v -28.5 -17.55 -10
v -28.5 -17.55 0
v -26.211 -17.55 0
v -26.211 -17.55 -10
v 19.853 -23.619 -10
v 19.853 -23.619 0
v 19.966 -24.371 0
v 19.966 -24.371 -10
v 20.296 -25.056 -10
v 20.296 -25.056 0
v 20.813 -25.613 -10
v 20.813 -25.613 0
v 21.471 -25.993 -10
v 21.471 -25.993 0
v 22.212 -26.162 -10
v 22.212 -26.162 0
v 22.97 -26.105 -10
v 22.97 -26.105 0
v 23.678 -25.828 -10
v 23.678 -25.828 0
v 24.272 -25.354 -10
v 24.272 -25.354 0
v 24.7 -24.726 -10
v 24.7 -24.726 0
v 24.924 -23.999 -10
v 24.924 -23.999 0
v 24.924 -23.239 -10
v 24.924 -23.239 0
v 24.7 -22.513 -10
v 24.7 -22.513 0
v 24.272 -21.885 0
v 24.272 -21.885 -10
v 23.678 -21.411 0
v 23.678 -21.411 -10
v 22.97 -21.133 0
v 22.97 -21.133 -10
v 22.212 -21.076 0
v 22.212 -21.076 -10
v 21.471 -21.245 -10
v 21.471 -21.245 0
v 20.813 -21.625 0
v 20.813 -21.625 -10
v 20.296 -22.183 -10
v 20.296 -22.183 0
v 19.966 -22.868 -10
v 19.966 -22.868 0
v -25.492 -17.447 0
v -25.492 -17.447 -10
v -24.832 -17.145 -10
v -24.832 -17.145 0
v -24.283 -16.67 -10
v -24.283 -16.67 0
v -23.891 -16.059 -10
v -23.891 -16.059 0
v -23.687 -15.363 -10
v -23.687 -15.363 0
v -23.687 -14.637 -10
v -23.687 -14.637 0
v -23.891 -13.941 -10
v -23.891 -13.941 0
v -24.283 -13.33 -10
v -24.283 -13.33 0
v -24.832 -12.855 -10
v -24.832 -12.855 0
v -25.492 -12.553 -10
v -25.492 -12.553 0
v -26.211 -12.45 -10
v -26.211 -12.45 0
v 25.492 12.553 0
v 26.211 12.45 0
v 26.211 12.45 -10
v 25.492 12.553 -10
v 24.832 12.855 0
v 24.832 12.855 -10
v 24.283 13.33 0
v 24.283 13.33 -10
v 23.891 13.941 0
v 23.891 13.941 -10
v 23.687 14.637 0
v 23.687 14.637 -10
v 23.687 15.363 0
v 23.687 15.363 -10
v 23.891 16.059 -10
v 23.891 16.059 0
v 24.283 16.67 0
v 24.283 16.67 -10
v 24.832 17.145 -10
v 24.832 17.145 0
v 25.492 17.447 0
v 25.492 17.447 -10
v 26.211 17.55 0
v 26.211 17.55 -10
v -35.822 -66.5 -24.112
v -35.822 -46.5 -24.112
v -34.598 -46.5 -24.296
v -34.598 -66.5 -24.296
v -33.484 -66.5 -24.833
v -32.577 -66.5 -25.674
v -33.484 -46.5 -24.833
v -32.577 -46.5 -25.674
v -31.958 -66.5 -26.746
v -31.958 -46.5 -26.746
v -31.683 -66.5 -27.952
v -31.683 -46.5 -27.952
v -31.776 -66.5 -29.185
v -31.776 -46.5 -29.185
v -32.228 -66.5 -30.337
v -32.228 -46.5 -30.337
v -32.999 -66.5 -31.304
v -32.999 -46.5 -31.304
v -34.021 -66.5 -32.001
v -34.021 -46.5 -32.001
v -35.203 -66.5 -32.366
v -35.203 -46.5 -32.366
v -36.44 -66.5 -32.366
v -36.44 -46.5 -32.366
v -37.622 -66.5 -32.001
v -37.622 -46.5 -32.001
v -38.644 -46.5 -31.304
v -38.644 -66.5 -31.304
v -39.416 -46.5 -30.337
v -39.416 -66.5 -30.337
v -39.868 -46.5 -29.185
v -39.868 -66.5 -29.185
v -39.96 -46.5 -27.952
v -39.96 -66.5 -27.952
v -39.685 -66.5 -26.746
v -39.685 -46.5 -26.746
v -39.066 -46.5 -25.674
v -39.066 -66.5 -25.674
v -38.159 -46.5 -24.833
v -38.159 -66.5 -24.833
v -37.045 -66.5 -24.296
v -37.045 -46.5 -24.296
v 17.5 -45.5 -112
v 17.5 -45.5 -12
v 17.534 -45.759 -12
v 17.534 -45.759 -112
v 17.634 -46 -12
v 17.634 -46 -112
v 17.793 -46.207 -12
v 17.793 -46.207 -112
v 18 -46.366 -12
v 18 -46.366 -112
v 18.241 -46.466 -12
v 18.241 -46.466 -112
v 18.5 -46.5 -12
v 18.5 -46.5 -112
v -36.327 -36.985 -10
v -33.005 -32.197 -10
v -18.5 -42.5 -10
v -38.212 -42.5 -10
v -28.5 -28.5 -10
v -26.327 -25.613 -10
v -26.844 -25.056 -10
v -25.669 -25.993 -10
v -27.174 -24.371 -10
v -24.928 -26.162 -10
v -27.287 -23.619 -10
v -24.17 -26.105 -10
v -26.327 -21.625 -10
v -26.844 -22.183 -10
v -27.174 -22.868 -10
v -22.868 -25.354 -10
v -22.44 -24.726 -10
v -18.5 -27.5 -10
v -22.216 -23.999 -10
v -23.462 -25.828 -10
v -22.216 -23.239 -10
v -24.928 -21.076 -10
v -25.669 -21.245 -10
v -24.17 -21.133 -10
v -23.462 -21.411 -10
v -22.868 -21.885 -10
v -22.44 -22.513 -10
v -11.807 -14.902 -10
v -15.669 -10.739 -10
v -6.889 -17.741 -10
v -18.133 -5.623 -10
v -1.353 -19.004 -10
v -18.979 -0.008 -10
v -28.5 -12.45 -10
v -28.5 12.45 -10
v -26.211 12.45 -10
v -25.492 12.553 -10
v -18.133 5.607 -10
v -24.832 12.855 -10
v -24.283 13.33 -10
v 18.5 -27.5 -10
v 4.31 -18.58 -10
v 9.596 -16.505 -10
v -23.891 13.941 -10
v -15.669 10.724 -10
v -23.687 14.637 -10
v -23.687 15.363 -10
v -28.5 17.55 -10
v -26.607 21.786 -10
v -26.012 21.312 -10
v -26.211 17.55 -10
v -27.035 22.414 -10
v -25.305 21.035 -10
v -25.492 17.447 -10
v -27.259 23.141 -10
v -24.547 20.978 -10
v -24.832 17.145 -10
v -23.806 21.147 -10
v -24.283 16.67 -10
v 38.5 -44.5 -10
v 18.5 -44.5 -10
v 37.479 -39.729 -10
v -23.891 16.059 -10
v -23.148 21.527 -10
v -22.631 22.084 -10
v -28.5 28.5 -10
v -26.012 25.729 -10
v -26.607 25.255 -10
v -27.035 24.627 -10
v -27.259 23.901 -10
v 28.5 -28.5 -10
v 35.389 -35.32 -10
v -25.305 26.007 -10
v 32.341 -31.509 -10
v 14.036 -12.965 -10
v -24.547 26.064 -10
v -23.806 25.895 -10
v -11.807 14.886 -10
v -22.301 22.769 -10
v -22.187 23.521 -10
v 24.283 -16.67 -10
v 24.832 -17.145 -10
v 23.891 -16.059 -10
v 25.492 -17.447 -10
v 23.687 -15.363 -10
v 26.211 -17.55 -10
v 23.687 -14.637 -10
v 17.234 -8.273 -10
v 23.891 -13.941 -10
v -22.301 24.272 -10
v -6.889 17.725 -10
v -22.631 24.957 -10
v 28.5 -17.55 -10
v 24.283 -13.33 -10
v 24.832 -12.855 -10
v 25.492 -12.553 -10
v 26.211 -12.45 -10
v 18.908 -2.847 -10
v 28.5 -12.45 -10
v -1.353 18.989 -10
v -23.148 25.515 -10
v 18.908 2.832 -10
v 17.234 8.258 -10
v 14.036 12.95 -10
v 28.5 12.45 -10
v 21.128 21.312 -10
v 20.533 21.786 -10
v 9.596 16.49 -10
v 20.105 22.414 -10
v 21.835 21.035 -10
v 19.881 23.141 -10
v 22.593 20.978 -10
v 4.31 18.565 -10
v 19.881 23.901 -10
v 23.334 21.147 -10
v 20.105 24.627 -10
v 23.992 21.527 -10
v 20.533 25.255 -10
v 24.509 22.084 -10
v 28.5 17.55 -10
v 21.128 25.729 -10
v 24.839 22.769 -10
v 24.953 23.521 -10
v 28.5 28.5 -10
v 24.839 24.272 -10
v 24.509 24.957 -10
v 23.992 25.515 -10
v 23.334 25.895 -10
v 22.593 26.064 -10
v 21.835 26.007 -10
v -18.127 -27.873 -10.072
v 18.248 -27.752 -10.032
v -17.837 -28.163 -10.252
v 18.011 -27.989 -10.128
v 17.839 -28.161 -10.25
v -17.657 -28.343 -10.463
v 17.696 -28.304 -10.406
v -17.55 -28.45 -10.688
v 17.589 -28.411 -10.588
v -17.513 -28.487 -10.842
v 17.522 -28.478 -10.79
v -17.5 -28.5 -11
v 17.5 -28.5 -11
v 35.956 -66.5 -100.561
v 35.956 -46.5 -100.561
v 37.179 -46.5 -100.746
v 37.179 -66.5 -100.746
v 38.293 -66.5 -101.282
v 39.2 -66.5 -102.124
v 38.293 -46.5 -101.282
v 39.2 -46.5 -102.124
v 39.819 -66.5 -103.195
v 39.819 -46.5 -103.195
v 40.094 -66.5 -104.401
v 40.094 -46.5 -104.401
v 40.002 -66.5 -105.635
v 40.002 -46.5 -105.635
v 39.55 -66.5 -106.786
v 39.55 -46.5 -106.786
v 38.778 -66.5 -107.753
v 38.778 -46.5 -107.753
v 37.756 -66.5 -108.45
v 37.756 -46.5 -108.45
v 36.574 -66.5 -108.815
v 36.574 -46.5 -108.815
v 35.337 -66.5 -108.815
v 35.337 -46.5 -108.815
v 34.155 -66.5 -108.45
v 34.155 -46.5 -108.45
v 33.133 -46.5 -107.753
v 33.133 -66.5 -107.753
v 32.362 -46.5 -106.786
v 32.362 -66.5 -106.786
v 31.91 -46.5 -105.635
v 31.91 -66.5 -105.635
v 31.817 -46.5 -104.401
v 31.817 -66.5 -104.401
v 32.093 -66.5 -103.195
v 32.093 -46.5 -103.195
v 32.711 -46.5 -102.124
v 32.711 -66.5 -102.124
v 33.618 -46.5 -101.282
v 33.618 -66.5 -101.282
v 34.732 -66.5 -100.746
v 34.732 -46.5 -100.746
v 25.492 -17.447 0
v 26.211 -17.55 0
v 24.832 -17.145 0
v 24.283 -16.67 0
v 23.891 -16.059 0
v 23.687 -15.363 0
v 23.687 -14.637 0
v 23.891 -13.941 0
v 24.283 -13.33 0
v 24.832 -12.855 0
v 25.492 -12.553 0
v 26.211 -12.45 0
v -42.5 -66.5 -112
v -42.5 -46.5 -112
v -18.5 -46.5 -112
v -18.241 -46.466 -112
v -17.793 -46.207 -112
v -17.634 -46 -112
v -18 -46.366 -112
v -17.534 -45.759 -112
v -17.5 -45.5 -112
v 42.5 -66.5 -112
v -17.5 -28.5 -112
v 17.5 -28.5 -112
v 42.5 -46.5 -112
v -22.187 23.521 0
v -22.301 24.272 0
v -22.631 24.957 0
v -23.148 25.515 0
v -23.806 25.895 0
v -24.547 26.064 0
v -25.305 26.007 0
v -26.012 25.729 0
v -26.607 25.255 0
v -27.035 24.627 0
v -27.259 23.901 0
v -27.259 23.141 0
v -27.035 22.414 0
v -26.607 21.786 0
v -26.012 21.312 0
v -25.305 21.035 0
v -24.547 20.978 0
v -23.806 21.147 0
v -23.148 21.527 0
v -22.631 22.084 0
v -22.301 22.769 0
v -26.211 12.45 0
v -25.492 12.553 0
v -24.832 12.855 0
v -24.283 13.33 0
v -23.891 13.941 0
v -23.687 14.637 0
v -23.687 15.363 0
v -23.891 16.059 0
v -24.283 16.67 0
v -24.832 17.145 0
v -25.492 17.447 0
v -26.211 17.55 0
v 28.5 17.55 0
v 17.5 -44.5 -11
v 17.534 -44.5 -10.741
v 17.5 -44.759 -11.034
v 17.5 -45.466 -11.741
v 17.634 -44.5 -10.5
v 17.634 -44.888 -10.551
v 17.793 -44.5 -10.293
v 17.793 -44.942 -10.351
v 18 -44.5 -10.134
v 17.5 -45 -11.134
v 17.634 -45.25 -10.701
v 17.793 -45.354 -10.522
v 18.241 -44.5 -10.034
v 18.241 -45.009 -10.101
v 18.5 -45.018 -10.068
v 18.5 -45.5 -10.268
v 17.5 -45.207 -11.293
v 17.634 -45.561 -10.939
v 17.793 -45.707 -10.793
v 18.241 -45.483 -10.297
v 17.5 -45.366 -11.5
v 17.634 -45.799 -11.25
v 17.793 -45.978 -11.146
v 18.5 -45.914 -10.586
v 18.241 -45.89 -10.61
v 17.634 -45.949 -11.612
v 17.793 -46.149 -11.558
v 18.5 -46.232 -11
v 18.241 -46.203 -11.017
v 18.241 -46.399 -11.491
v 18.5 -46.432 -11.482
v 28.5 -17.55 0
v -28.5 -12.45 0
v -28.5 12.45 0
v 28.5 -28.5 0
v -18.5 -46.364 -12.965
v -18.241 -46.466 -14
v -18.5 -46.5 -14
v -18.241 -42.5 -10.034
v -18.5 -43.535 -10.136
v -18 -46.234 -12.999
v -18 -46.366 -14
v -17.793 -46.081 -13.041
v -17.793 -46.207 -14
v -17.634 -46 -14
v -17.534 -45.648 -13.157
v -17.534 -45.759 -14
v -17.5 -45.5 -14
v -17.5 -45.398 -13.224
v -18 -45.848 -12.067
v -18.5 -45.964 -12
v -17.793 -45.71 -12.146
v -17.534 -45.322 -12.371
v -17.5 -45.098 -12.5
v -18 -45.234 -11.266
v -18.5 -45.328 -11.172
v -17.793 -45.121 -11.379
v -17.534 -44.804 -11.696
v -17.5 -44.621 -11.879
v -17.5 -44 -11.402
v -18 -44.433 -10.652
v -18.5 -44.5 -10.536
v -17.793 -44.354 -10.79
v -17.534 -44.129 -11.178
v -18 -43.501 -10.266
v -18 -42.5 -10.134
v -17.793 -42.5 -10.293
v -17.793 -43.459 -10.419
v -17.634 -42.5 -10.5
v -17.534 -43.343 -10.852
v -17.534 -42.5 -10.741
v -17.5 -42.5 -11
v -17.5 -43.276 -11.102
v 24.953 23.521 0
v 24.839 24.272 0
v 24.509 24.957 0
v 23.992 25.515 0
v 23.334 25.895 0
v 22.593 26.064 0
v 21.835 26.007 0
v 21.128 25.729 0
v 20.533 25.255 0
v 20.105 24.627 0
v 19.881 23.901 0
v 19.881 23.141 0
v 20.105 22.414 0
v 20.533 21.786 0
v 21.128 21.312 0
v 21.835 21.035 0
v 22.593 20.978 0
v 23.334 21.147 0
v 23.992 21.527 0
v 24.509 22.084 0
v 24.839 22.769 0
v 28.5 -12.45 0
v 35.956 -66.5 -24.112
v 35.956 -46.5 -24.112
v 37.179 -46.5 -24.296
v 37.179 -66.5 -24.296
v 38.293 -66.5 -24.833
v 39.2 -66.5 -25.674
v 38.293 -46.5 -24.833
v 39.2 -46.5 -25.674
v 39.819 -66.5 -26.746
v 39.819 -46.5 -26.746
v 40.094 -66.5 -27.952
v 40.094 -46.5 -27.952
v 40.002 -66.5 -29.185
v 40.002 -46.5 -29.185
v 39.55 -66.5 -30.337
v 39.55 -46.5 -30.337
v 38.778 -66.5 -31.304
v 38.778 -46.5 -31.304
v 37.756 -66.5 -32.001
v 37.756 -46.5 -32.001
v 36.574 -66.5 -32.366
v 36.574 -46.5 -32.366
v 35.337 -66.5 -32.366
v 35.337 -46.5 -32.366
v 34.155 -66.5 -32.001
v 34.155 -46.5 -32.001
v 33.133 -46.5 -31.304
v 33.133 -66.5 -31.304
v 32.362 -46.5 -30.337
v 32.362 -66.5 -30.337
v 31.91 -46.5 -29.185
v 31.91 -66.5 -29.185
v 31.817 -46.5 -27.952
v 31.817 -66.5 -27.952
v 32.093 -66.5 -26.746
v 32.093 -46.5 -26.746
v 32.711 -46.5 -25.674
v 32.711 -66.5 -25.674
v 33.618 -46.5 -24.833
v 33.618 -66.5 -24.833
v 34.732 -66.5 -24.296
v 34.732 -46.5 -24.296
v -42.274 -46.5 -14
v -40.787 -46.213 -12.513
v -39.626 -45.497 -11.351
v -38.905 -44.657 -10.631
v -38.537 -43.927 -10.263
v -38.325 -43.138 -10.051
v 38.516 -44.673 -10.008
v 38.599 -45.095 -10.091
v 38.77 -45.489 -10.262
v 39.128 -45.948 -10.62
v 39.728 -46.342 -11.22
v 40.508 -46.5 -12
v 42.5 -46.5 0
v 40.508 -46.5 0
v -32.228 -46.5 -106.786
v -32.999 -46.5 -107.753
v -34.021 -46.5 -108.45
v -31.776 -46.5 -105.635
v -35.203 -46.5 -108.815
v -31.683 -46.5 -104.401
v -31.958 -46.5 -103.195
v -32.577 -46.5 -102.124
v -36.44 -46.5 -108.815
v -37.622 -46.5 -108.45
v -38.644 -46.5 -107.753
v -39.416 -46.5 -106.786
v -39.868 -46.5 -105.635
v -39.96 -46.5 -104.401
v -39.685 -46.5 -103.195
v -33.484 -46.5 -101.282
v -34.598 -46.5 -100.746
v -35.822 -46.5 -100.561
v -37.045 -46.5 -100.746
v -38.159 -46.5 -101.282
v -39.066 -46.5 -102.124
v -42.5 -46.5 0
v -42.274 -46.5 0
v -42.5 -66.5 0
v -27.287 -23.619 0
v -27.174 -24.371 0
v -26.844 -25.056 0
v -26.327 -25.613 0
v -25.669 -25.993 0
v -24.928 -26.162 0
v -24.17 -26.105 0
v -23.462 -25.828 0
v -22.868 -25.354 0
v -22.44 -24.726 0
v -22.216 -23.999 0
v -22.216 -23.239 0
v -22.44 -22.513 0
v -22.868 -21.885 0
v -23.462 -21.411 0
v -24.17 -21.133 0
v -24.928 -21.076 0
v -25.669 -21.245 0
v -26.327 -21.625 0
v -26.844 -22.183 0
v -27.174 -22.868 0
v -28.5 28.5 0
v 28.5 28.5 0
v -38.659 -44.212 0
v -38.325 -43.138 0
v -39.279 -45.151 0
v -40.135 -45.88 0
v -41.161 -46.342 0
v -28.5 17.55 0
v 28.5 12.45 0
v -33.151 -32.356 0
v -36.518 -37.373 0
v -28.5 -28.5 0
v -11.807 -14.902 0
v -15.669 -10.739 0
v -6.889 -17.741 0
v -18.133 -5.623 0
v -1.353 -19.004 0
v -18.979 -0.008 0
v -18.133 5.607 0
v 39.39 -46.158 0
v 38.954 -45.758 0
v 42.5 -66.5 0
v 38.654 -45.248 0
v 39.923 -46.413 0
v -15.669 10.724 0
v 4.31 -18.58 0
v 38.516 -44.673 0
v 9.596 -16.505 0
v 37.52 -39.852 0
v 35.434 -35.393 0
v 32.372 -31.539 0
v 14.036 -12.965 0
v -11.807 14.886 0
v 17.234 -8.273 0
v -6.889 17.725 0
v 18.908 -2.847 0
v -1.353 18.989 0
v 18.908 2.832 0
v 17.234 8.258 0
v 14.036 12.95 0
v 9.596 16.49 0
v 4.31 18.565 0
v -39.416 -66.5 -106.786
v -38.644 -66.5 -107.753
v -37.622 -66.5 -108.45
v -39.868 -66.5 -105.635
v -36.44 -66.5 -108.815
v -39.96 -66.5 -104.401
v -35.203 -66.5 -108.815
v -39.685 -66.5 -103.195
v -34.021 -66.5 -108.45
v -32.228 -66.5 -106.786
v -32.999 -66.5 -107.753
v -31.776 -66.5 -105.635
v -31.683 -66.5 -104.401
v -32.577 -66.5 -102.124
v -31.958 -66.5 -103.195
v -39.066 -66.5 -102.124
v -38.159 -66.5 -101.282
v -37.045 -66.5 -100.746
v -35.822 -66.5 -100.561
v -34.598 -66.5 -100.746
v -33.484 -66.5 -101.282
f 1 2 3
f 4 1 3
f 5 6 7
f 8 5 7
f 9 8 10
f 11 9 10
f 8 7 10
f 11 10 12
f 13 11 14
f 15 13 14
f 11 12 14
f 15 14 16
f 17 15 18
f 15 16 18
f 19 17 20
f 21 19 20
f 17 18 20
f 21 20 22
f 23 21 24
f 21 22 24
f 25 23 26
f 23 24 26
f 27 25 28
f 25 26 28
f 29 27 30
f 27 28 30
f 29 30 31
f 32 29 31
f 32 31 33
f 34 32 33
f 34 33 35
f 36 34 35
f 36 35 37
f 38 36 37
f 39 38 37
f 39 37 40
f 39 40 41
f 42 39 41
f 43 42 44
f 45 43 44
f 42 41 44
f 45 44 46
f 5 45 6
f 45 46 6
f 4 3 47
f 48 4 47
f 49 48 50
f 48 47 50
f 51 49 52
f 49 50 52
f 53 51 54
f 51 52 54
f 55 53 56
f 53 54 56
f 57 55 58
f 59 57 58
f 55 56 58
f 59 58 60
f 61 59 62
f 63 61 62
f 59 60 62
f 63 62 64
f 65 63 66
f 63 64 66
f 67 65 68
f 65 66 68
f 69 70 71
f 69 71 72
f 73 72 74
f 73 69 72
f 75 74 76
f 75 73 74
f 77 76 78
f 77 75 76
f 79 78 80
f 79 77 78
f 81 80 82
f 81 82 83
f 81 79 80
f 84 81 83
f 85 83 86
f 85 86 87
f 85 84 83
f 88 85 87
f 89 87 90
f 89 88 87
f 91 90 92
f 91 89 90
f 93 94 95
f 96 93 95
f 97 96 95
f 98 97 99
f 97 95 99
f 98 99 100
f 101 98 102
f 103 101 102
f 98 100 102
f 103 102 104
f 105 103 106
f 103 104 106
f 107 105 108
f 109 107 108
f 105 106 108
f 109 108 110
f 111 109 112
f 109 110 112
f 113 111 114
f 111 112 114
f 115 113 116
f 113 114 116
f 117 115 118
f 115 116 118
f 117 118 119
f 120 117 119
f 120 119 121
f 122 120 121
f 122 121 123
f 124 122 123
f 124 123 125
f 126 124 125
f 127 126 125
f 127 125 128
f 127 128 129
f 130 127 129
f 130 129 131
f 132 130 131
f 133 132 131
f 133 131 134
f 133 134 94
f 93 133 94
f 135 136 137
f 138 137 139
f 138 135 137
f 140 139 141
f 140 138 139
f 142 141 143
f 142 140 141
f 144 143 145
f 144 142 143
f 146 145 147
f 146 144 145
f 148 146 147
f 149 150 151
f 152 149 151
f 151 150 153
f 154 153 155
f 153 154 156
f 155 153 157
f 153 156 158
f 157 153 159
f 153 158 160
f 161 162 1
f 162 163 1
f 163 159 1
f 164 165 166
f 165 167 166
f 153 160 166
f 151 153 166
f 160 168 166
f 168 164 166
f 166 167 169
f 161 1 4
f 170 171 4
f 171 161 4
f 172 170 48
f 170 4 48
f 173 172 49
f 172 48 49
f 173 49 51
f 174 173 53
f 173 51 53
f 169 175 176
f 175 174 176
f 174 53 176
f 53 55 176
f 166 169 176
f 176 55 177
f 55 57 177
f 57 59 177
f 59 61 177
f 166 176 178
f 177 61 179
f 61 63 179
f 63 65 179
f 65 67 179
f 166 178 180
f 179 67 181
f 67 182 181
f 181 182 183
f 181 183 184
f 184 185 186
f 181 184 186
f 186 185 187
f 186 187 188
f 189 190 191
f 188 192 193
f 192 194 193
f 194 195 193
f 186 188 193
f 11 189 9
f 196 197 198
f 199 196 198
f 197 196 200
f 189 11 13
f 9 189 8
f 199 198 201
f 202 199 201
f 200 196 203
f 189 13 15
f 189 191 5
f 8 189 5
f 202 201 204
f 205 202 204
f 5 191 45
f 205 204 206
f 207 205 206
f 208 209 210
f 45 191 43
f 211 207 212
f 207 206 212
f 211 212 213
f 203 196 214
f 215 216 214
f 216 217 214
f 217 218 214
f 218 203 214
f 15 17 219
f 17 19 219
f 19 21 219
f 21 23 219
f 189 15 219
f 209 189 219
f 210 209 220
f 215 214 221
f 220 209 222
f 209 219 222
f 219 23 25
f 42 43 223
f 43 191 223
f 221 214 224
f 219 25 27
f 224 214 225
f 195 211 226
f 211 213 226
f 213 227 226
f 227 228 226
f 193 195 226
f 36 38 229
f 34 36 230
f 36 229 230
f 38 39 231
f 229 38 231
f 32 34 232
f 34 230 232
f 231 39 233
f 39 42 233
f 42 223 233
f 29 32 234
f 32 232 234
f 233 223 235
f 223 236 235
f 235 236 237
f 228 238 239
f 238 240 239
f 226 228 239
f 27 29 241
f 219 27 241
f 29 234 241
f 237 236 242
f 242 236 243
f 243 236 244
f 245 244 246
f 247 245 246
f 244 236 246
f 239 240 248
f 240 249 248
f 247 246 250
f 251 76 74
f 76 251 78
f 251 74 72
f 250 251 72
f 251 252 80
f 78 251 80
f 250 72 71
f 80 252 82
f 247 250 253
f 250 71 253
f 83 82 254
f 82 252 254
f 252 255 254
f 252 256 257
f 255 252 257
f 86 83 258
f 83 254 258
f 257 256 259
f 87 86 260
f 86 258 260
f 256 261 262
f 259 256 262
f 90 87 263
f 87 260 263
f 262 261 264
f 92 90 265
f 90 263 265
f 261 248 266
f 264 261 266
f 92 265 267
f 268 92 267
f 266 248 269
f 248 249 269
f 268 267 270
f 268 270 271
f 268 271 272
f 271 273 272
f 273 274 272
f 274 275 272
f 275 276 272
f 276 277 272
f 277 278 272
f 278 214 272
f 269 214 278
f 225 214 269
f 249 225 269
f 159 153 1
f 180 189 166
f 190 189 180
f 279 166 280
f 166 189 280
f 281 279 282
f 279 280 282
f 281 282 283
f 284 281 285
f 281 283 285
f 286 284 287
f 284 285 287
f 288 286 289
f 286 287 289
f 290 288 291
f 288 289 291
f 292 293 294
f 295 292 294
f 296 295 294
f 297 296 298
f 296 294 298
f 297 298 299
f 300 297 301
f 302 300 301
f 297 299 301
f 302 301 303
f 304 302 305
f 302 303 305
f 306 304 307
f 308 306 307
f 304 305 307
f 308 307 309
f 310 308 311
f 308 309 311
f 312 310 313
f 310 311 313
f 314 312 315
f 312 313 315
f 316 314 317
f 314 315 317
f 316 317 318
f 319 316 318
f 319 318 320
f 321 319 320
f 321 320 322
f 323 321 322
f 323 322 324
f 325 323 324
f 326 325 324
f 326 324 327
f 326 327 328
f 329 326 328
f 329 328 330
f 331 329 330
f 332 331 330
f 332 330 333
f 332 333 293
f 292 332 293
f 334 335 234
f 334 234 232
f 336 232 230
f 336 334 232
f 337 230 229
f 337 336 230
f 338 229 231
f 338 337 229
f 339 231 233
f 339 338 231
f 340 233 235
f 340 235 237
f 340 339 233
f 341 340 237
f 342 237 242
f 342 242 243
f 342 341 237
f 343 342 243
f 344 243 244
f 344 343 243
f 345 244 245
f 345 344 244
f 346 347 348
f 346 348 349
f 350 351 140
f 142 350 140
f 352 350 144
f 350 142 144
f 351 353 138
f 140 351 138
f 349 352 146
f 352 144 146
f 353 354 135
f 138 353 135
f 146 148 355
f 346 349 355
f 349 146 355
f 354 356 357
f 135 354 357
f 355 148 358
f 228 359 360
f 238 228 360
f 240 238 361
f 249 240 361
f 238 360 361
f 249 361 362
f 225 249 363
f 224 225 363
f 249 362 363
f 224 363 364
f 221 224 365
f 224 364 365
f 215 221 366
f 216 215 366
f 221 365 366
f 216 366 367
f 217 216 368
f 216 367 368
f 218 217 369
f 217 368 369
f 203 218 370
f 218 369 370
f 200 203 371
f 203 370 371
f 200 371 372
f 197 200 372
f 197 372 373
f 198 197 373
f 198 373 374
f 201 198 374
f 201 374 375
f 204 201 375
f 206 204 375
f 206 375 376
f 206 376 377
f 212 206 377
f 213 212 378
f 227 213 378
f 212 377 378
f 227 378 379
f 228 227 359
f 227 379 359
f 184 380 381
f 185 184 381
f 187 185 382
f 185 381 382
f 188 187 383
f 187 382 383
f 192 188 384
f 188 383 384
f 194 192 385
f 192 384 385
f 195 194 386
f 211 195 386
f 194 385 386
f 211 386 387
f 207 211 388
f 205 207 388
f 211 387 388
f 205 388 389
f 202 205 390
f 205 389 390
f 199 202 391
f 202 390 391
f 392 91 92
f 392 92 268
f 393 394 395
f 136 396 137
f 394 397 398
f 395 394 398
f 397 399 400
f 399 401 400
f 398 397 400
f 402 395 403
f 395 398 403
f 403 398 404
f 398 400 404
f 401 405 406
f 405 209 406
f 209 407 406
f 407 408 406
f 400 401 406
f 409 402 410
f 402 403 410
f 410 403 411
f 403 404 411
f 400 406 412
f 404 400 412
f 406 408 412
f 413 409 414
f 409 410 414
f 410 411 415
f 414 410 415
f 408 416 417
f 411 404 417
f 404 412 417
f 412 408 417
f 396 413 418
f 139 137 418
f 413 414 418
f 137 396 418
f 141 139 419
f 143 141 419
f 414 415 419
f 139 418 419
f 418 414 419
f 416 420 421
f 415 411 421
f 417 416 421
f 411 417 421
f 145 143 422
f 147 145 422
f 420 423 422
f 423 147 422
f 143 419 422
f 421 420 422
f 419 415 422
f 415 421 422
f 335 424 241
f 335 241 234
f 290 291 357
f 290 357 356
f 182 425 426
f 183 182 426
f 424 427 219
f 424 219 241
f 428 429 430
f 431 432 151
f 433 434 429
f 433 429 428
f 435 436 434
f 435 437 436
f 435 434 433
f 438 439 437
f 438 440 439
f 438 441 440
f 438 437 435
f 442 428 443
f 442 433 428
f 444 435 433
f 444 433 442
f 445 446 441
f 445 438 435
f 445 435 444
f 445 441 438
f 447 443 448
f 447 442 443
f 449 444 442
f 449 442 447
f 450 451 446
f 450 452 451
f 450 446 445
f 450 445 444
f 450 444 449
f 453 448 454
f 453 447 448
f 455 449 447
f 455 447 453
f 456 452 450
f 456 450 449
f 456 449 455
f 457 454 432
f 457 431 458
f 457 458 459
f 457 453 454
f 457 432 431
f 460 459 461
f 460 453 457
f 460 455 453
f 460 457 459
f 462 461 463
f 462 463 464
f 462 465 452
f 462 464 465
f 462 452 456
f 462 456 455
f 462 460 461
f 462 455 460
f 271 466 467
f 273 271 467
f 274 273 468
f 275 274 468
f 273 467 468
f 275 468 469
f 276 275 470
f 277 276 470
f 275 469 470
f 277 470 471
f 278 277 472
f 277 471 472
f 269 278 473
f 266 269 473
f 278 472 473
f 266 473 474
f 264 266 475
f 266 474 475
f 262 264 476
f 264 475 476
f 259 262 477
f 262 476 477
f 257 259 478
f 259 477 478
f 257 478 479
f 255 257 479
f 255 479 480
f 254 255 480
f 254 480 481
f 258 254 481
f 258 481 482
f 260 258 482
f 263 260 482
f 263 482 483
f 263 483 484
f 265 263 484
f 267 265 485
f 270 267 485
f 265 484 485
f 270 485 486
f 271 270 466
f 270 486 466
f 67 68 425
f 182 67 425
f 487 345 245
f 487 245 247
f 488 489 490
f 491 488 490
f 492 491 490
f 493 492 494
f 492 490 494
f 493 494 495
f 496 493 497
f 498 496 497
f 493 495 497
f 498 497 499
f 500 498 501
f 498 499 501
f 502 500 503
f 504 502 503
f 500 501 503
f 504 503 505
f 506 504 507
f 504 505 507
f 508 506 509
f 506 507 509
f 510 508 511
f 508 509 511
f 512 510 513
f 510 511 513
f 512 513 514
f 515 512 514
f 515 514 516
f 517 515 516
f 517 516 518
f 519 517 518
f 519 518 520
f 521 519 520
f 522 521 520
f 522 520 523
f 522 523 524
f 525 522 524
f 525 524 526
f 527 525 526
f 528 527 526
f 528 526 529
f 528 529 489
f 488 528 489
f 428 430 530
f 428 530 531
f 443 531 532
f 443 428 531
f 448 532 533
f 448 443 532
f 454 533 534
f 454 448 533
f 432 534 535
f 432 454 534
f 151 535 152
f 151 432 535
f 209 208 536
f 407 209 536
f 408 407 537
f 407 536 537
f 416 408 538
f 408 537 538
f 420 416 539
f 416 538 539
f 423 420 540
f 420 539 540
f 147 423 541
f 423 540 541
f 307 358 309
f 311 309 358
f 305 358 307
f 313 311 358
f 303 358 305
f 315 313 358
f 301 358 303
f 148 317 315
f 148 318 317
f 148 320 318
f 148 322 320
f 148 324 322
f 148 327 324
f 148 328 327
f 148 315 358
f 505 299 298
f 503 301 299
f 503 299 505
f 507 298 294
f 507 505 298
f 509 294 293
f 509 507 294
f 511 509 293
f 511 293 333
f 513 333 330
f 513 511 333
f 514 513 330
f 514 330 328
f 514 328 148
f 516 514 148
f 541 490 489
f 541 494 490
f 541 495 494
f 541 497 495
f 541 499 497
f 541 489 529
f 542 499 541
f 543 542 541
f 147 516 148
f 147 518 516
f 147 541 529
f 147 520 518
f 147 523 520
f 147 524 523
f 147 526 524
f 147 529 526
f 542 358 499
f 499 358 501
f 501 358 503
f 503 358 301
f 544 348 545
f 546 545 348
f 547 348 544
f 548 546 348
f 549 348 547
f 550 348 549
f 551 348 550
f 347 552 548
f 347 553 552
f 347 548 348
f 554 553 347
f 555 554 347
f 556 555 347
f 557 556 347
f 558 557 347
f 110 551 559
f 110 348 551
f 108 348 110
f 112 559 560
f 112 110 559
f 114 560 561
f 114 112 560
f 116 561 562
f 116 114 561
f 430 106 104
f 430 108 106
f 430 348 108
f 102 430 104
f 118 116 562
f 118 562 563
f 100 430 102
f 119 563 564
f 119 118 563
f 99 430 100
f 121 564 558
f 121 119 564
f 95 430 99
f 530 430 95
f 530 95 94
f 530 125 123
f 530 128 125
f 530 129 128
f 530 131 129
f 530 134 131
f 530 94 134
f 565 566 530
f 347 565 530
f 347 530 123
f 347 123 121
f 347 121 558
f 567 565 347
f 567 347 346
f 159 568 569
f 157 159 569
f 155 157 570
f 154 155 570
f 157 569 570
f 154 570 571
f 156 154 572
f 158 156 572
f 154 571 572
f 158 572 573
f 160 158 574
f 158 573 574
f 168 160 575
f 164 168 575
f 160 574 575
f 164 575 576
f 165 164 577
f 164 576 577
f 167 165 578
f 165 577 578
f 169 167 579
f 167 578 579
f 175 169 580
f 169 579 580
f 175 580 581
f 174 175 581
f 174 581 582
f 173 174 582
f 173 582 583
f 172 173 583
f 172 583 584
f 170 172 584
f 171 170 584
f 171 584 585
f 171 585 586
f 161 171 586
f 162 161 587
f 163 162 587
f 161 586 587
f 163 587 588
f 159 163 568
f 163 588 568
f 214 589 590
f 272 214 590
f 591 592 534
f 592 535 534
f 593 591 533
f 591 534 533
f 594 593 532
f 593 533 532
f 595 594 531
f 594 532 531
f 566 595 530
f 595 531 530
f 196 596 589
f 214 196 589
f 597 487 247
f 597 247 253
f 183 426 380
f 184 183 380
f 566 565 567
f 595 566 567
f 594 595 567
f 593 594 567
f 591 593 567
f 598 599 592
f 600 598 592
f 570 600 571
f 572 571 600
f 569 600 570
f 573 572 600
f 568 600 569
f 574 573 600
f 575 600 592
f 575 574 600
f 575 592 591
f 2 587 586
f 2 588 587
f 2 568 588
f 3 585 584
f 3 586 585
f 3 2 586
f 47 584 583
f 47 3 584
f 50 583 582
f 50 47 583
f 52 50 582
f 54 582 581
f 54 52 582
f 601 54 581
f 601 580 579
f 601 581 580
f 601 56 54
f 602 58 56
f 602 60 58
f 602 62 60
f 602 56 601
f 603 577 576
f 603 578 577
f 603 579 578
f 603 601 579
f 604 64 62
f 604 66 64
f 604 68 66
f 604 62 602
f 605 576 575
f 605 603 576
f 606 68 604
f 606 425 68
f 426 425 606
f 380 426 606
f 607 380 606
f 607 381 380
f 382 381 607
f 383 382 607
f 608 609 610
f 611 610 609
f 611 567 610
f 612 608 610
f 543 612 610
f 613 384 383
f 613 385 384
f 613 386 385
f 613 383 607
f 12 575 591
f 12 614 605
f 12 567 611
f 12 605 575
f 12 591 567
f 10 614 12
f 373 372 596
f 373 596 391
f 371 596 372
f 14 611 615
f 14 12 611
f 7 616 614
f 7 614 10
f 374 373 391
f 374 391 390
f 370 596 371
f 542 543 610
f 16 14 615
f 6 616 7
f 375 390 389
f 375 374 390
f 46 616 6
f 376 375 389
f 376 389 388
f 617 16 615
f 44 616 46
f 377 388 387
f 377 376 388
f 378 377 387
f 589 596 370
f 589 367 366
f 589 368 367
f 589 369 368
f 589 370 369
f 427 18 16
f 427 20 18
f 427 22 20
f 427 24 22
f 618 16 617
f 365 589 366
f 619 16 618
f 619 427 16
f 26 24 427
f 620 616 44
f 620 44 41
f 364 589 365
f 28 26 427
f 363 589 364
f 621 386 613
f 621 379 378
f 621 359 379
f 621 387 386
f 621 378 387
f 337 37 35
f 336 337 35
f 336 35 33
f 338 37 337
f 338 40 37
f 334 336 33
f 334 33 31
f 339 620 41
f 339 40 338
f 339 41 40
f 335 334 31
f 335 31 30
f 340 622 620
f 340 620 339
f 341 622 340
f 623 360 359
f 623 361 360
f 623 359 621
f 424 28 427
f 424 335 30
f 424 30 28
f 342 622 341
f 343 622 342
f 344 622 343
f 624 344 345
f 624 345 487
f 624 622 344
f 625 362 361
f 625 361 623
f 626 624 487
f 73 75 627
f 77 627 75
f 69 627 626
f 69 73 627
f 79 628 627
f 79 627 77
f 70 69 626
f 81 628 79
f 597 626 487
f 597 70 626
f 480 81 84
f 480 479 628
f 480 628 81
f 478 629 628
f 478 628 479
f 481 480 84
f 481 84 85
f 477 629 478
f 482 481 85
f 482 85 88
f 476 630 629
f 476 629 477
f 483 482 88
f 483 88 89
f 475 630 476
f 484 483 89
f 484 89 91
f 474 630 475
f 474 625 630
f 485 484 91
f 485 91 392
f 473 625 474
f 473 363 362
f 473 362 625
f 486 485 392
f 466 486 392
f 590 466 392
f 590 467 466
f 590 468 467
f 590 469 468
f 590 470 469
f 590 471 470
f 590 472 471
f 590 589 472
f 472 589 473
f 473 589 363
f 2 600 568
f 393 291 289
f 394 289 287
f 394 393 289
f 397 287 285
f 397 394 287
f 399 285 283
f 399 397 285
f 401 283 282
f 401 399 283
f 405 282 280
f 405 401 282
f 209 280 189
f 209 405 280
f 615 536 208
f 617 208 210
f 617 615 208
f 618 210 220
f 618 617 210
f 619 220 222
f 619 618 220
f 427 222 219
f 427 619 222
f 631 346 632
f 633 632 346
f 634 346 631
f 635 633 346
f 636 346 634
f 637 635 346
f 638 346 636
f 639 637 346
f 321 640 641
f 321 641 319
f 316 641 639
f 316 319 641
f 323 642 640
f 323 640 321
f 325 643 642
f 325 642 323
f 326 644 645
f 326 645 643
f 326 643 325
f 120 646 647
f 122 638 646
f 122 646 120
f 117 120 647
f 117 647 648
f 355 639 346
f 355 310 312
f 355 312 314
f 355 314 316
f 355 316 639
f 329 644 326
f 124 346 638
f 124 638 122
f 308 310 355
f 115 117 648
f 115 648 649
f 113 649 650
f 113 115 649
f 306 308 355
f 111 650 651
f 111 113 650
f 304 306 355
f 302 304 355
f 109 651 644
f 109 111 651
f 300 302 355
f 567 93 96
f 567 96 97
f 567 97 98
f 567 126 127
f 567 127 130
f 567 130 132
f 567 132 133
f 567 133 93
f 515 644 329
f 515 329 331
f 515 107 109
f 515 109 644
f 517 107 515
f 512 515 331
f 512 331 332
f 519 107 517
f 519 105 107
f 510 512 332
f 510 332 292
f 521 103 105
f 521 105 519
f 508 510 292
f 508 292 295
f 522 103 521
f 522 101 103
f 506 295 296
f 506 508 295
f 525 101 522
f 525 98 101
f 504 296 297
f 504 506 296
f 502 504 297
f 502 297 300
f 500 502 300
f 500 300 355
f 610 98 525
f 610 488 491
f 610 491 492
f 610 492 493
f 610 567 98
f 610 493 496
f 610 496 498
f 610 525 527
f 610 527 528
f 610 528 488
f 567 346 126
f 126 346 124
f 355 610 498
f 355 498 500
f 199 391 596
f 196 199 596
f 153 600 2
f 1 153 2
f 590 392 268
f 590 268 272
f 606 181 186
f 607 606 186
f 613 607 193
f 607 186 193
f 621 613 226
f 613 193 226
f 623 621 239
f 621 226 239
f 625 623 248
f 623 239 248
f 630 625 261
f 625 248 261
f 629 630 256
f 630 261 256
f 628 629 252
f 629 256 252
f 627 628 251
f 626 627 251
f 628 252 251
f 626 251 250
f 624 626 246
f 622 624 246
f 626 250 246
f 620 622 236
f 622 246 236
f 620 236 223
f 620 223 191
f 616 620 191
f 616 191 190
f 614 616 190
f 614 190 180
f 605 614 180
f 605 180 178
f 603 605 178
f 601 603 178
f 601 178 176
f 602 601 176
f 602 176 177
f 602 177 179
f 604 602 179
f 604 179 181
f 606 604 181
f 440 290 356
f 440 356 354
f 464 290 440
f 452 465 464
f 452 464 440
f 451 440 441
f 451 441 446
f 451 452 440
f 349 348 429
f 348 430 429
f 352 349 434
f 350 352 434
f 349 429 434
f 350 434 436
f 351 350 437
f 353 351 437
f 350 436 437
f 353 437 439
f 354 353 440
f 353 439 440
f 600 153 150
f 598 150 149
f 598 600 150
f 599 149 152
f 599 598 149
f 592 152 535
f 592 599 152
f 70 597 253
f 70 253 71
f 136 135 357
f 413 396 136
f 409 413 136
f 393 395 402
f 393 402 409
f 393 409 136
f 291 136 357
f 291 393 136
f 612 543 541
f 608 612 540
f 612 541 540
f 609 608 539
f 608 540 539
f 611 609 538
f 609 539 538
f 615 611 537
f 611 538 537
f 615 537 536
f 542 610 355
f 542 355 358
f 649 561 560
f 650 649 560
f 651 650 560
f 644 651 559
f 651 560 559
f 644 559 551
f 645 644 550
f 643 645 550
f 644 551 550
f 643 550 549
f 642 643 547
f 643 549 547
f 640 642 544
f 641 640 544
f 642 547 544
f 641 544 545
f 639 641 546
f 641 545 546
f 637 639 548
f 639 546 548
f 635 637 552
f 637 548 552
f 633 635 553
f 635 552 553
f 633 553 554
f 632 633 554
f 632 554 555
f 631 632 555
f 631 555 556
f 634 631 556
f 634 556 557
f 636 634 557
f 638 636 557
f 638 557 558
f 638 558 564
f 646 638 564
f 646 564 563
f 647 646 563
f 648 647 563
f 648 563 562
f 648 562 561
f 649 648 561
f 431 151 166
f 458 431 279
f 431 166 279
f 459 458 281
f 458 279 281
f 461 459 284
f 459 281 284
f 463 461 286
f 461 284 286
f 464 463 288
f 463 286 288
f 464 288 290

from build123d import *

# Parameters (mm, degrees)
SKETCH3_W           = 57
SKETCH3_H           = 57
BOSS_EXTRUDE1_DEPTH = 10
SKETCH3_3_R         = 2.55
CUT_EXTRUDE1_DEPTH  = 10
BOSS_EXTRUDE2_DEPTH = 112
SKETCH4_R           = 19.05
CUT_EXTRUDE2_DEPTH  = 129.967050055
SKETCH5_R           = 4.15
CUT_EXTRUDE5_DEPTH  = 142.333824685
BOSS_EXTRUDE3_DEPTH = 10
FILLET2_R           = 4
FILLET3_R           = 2
FILLET4_R           = 1


with BuildPart() as part:
    # Sketch3 → Boss-Extrude1 (new body)
    with BuildSketch(Plane.XY):
        Rectangle(SKETCH3_W, SKETCH3_H)
    extrude(amount=-BOSS_EXTRUDE1_DEPTH)

    # Sketch3<3> → Cut-Extrude1 (cut)
    with BuildSketch(Plane.XY):
        with Locations((-24.737446492, 23.520851333)):
            Circle(SKETCH3_3_R)
        with Locations((22.402553508, 23.520851333)):
            Circle(SKETCH3_3_R)
        with Locations((22.402553508, -23.619148667)):
            Circle(SKETCH3_3_R)
        with Locations((-24.737446492, -23.619148667)):
            Circle(SKETCH3_3_R)
        with BuildLine():
            Line((26.210614643, 17.55), (28.5, 17.55))
            Line((28.5, 17.55), (28.5, 12.45))
            Line((28.5, 12.45), (26.210614643, 12.45))
            ThreePointArc((26.210614643, 12.45), (23.660614643, 15), (26.210614643, 17.55))
        make_face()
        with BuildLine():
            Line((26.210614643, -12.45), (28.5, -12.45))
            Line((28.5, -12.45), (28.5, -17.55))
            Line((28.5, -17.55), (26.210614643, -17.55))
            ThreePointArc((26.210614643, -17.55), (23.660614643, -15), (26.210614643, -12.45))
        make_face()
        with BuildLine():
            Line((-26.210614643, -12.45), (-28.5, -12.45))
            Line((-28.5, -12.45), (-28.5, -17.55))
            Line((-28.5, -17.55), (-26.210614643, -17.55))
            ThreePointArc((-26.210614643, -17.55), (-23.660614643, -15), (-26.210614643, -12.45))
        make_face()
        with BuildLine():
            Line((-26.210614643, 17.55), (-28.5, 17.55))
            Line((-28.5, 17.55), (-28.5, 12.45))
            Line((-28.5, 12.45), (-26.210614643, 12.45))
            ThreePointArc((-26.210614643, 12.45), (-23.660614643, 15), (-26.210614643, 17.55))
        make_face()
    extrude(amount=-CUT_EXTRUDE1_DEPTH, mode=Mode.SUBTRACT)

    # Sketch3<4> → Boss-Extrude2 (add)
    with BuildSketch(Plane.XY):
        Polygon((17.5, -46.5), (17.5, -28.5), (-17.5, -28.5), (-17.5, -46.5), (-42.5, -46.5), (-42.5, -66.5), (42.5, -66.5), (42.5, -46.5), align=None)
    extrude(amount=-BOSS_EXTRUDE2_DEPTH)

    # Sketch4 → Cut-Extrude2 (cut, through all)
    with BuildSketch(Plane(origin=(0, 0, -10), x_dir=(-1, 0, 0), z_dir=(0, 0, -1))):
        with Locations((-0.070866951, -0.007657079)):
            Circle(SKETCH4_R)
    extrude(amount=-CUT_EXTRUDE2_DEPTH, mode=Mode.SUBTRACT)

    # Sketch5 → Cut-Extrude5 (cut, through all)
    with BuildSketch(Plane(origin=(0, -46.5, 0), x_dir=(1, 0, 0), z_dir=(0, 1, 0))):
        with Locations((35.955648409, 104.71127815)):
            Circle(SKETCH5_R)
        with Locations((35.955648409, 28.261929333)):
            Circle(SKETCH5_R)
        with Locations((-35.821593513, 28.261929333)):
            Circle(SKETCH5_R)
        with Locations((-35.821593513, 104.71127815)):
            Circle(SKETCH5_R)
    extrude(amount=-CUT_EXTRUDE5_DEPTH, mode=Mode.SUBTRACT)

    # Sketch6 → Boss-Extrude3 (add)
    with BuildSketch(Plane.XY):
        with BuildLine():
            Line((-17.5, -28.5), (-28.5, -28.5))
            ThreePointArc((-28.5, -28.5), (-35.898984404, -36.181212625), (-38.59502311, -46.5))
            Line((-38.59502311, -46.5), (-17.5, -46.5))
            Line((-17.5, -46.5), (-17.5, -28.5))
        make_face()
        with BuildLine():
            Line((17.5, -28.5), (17.5, -46.5))
            Line((17.5, -46.5), (38.59502311, -46.5))
            ThreePointArc((38.59502311, -46.5), (35.898984404, -36.181212625), (28.5, -28.5))
            Line((28.5, -28.5), (17.5, -28.5))
        make_face()
    extrude(amount=-BOSS_EXTRUDE3_DEPTH)

    # Fillet2
    fillet2_edges = [part.edges().sort_by_distance(p)[0] for p in [
        (-28.047511555, -46.5, -10),
        (-38.59502311, -46.5, -5),
    ]]
    fillet(fillet2_edges, radius=FILLET2_R)

    # Fillet3
    fillet3_edges = [part.edges().sort_by_distance(p)[0] for p in [
        (38.59502311, -46.5, -5),
        (28.047511555, -46.5, -10),
    ]]
    fillet(fillet3_edges, radius=FILLET3_R)

    # Fillet4
    fillet4_edges = [part.edges().sort_by_distance(p)[0] for p in [
        (-17.5, -35.5, -10),
        (17.5, -36.5, -10),
        (0, -28.5, -10),
    ]]
    fillet(fillet4_edges, radius=FILLET4_R)


solid = part.part
